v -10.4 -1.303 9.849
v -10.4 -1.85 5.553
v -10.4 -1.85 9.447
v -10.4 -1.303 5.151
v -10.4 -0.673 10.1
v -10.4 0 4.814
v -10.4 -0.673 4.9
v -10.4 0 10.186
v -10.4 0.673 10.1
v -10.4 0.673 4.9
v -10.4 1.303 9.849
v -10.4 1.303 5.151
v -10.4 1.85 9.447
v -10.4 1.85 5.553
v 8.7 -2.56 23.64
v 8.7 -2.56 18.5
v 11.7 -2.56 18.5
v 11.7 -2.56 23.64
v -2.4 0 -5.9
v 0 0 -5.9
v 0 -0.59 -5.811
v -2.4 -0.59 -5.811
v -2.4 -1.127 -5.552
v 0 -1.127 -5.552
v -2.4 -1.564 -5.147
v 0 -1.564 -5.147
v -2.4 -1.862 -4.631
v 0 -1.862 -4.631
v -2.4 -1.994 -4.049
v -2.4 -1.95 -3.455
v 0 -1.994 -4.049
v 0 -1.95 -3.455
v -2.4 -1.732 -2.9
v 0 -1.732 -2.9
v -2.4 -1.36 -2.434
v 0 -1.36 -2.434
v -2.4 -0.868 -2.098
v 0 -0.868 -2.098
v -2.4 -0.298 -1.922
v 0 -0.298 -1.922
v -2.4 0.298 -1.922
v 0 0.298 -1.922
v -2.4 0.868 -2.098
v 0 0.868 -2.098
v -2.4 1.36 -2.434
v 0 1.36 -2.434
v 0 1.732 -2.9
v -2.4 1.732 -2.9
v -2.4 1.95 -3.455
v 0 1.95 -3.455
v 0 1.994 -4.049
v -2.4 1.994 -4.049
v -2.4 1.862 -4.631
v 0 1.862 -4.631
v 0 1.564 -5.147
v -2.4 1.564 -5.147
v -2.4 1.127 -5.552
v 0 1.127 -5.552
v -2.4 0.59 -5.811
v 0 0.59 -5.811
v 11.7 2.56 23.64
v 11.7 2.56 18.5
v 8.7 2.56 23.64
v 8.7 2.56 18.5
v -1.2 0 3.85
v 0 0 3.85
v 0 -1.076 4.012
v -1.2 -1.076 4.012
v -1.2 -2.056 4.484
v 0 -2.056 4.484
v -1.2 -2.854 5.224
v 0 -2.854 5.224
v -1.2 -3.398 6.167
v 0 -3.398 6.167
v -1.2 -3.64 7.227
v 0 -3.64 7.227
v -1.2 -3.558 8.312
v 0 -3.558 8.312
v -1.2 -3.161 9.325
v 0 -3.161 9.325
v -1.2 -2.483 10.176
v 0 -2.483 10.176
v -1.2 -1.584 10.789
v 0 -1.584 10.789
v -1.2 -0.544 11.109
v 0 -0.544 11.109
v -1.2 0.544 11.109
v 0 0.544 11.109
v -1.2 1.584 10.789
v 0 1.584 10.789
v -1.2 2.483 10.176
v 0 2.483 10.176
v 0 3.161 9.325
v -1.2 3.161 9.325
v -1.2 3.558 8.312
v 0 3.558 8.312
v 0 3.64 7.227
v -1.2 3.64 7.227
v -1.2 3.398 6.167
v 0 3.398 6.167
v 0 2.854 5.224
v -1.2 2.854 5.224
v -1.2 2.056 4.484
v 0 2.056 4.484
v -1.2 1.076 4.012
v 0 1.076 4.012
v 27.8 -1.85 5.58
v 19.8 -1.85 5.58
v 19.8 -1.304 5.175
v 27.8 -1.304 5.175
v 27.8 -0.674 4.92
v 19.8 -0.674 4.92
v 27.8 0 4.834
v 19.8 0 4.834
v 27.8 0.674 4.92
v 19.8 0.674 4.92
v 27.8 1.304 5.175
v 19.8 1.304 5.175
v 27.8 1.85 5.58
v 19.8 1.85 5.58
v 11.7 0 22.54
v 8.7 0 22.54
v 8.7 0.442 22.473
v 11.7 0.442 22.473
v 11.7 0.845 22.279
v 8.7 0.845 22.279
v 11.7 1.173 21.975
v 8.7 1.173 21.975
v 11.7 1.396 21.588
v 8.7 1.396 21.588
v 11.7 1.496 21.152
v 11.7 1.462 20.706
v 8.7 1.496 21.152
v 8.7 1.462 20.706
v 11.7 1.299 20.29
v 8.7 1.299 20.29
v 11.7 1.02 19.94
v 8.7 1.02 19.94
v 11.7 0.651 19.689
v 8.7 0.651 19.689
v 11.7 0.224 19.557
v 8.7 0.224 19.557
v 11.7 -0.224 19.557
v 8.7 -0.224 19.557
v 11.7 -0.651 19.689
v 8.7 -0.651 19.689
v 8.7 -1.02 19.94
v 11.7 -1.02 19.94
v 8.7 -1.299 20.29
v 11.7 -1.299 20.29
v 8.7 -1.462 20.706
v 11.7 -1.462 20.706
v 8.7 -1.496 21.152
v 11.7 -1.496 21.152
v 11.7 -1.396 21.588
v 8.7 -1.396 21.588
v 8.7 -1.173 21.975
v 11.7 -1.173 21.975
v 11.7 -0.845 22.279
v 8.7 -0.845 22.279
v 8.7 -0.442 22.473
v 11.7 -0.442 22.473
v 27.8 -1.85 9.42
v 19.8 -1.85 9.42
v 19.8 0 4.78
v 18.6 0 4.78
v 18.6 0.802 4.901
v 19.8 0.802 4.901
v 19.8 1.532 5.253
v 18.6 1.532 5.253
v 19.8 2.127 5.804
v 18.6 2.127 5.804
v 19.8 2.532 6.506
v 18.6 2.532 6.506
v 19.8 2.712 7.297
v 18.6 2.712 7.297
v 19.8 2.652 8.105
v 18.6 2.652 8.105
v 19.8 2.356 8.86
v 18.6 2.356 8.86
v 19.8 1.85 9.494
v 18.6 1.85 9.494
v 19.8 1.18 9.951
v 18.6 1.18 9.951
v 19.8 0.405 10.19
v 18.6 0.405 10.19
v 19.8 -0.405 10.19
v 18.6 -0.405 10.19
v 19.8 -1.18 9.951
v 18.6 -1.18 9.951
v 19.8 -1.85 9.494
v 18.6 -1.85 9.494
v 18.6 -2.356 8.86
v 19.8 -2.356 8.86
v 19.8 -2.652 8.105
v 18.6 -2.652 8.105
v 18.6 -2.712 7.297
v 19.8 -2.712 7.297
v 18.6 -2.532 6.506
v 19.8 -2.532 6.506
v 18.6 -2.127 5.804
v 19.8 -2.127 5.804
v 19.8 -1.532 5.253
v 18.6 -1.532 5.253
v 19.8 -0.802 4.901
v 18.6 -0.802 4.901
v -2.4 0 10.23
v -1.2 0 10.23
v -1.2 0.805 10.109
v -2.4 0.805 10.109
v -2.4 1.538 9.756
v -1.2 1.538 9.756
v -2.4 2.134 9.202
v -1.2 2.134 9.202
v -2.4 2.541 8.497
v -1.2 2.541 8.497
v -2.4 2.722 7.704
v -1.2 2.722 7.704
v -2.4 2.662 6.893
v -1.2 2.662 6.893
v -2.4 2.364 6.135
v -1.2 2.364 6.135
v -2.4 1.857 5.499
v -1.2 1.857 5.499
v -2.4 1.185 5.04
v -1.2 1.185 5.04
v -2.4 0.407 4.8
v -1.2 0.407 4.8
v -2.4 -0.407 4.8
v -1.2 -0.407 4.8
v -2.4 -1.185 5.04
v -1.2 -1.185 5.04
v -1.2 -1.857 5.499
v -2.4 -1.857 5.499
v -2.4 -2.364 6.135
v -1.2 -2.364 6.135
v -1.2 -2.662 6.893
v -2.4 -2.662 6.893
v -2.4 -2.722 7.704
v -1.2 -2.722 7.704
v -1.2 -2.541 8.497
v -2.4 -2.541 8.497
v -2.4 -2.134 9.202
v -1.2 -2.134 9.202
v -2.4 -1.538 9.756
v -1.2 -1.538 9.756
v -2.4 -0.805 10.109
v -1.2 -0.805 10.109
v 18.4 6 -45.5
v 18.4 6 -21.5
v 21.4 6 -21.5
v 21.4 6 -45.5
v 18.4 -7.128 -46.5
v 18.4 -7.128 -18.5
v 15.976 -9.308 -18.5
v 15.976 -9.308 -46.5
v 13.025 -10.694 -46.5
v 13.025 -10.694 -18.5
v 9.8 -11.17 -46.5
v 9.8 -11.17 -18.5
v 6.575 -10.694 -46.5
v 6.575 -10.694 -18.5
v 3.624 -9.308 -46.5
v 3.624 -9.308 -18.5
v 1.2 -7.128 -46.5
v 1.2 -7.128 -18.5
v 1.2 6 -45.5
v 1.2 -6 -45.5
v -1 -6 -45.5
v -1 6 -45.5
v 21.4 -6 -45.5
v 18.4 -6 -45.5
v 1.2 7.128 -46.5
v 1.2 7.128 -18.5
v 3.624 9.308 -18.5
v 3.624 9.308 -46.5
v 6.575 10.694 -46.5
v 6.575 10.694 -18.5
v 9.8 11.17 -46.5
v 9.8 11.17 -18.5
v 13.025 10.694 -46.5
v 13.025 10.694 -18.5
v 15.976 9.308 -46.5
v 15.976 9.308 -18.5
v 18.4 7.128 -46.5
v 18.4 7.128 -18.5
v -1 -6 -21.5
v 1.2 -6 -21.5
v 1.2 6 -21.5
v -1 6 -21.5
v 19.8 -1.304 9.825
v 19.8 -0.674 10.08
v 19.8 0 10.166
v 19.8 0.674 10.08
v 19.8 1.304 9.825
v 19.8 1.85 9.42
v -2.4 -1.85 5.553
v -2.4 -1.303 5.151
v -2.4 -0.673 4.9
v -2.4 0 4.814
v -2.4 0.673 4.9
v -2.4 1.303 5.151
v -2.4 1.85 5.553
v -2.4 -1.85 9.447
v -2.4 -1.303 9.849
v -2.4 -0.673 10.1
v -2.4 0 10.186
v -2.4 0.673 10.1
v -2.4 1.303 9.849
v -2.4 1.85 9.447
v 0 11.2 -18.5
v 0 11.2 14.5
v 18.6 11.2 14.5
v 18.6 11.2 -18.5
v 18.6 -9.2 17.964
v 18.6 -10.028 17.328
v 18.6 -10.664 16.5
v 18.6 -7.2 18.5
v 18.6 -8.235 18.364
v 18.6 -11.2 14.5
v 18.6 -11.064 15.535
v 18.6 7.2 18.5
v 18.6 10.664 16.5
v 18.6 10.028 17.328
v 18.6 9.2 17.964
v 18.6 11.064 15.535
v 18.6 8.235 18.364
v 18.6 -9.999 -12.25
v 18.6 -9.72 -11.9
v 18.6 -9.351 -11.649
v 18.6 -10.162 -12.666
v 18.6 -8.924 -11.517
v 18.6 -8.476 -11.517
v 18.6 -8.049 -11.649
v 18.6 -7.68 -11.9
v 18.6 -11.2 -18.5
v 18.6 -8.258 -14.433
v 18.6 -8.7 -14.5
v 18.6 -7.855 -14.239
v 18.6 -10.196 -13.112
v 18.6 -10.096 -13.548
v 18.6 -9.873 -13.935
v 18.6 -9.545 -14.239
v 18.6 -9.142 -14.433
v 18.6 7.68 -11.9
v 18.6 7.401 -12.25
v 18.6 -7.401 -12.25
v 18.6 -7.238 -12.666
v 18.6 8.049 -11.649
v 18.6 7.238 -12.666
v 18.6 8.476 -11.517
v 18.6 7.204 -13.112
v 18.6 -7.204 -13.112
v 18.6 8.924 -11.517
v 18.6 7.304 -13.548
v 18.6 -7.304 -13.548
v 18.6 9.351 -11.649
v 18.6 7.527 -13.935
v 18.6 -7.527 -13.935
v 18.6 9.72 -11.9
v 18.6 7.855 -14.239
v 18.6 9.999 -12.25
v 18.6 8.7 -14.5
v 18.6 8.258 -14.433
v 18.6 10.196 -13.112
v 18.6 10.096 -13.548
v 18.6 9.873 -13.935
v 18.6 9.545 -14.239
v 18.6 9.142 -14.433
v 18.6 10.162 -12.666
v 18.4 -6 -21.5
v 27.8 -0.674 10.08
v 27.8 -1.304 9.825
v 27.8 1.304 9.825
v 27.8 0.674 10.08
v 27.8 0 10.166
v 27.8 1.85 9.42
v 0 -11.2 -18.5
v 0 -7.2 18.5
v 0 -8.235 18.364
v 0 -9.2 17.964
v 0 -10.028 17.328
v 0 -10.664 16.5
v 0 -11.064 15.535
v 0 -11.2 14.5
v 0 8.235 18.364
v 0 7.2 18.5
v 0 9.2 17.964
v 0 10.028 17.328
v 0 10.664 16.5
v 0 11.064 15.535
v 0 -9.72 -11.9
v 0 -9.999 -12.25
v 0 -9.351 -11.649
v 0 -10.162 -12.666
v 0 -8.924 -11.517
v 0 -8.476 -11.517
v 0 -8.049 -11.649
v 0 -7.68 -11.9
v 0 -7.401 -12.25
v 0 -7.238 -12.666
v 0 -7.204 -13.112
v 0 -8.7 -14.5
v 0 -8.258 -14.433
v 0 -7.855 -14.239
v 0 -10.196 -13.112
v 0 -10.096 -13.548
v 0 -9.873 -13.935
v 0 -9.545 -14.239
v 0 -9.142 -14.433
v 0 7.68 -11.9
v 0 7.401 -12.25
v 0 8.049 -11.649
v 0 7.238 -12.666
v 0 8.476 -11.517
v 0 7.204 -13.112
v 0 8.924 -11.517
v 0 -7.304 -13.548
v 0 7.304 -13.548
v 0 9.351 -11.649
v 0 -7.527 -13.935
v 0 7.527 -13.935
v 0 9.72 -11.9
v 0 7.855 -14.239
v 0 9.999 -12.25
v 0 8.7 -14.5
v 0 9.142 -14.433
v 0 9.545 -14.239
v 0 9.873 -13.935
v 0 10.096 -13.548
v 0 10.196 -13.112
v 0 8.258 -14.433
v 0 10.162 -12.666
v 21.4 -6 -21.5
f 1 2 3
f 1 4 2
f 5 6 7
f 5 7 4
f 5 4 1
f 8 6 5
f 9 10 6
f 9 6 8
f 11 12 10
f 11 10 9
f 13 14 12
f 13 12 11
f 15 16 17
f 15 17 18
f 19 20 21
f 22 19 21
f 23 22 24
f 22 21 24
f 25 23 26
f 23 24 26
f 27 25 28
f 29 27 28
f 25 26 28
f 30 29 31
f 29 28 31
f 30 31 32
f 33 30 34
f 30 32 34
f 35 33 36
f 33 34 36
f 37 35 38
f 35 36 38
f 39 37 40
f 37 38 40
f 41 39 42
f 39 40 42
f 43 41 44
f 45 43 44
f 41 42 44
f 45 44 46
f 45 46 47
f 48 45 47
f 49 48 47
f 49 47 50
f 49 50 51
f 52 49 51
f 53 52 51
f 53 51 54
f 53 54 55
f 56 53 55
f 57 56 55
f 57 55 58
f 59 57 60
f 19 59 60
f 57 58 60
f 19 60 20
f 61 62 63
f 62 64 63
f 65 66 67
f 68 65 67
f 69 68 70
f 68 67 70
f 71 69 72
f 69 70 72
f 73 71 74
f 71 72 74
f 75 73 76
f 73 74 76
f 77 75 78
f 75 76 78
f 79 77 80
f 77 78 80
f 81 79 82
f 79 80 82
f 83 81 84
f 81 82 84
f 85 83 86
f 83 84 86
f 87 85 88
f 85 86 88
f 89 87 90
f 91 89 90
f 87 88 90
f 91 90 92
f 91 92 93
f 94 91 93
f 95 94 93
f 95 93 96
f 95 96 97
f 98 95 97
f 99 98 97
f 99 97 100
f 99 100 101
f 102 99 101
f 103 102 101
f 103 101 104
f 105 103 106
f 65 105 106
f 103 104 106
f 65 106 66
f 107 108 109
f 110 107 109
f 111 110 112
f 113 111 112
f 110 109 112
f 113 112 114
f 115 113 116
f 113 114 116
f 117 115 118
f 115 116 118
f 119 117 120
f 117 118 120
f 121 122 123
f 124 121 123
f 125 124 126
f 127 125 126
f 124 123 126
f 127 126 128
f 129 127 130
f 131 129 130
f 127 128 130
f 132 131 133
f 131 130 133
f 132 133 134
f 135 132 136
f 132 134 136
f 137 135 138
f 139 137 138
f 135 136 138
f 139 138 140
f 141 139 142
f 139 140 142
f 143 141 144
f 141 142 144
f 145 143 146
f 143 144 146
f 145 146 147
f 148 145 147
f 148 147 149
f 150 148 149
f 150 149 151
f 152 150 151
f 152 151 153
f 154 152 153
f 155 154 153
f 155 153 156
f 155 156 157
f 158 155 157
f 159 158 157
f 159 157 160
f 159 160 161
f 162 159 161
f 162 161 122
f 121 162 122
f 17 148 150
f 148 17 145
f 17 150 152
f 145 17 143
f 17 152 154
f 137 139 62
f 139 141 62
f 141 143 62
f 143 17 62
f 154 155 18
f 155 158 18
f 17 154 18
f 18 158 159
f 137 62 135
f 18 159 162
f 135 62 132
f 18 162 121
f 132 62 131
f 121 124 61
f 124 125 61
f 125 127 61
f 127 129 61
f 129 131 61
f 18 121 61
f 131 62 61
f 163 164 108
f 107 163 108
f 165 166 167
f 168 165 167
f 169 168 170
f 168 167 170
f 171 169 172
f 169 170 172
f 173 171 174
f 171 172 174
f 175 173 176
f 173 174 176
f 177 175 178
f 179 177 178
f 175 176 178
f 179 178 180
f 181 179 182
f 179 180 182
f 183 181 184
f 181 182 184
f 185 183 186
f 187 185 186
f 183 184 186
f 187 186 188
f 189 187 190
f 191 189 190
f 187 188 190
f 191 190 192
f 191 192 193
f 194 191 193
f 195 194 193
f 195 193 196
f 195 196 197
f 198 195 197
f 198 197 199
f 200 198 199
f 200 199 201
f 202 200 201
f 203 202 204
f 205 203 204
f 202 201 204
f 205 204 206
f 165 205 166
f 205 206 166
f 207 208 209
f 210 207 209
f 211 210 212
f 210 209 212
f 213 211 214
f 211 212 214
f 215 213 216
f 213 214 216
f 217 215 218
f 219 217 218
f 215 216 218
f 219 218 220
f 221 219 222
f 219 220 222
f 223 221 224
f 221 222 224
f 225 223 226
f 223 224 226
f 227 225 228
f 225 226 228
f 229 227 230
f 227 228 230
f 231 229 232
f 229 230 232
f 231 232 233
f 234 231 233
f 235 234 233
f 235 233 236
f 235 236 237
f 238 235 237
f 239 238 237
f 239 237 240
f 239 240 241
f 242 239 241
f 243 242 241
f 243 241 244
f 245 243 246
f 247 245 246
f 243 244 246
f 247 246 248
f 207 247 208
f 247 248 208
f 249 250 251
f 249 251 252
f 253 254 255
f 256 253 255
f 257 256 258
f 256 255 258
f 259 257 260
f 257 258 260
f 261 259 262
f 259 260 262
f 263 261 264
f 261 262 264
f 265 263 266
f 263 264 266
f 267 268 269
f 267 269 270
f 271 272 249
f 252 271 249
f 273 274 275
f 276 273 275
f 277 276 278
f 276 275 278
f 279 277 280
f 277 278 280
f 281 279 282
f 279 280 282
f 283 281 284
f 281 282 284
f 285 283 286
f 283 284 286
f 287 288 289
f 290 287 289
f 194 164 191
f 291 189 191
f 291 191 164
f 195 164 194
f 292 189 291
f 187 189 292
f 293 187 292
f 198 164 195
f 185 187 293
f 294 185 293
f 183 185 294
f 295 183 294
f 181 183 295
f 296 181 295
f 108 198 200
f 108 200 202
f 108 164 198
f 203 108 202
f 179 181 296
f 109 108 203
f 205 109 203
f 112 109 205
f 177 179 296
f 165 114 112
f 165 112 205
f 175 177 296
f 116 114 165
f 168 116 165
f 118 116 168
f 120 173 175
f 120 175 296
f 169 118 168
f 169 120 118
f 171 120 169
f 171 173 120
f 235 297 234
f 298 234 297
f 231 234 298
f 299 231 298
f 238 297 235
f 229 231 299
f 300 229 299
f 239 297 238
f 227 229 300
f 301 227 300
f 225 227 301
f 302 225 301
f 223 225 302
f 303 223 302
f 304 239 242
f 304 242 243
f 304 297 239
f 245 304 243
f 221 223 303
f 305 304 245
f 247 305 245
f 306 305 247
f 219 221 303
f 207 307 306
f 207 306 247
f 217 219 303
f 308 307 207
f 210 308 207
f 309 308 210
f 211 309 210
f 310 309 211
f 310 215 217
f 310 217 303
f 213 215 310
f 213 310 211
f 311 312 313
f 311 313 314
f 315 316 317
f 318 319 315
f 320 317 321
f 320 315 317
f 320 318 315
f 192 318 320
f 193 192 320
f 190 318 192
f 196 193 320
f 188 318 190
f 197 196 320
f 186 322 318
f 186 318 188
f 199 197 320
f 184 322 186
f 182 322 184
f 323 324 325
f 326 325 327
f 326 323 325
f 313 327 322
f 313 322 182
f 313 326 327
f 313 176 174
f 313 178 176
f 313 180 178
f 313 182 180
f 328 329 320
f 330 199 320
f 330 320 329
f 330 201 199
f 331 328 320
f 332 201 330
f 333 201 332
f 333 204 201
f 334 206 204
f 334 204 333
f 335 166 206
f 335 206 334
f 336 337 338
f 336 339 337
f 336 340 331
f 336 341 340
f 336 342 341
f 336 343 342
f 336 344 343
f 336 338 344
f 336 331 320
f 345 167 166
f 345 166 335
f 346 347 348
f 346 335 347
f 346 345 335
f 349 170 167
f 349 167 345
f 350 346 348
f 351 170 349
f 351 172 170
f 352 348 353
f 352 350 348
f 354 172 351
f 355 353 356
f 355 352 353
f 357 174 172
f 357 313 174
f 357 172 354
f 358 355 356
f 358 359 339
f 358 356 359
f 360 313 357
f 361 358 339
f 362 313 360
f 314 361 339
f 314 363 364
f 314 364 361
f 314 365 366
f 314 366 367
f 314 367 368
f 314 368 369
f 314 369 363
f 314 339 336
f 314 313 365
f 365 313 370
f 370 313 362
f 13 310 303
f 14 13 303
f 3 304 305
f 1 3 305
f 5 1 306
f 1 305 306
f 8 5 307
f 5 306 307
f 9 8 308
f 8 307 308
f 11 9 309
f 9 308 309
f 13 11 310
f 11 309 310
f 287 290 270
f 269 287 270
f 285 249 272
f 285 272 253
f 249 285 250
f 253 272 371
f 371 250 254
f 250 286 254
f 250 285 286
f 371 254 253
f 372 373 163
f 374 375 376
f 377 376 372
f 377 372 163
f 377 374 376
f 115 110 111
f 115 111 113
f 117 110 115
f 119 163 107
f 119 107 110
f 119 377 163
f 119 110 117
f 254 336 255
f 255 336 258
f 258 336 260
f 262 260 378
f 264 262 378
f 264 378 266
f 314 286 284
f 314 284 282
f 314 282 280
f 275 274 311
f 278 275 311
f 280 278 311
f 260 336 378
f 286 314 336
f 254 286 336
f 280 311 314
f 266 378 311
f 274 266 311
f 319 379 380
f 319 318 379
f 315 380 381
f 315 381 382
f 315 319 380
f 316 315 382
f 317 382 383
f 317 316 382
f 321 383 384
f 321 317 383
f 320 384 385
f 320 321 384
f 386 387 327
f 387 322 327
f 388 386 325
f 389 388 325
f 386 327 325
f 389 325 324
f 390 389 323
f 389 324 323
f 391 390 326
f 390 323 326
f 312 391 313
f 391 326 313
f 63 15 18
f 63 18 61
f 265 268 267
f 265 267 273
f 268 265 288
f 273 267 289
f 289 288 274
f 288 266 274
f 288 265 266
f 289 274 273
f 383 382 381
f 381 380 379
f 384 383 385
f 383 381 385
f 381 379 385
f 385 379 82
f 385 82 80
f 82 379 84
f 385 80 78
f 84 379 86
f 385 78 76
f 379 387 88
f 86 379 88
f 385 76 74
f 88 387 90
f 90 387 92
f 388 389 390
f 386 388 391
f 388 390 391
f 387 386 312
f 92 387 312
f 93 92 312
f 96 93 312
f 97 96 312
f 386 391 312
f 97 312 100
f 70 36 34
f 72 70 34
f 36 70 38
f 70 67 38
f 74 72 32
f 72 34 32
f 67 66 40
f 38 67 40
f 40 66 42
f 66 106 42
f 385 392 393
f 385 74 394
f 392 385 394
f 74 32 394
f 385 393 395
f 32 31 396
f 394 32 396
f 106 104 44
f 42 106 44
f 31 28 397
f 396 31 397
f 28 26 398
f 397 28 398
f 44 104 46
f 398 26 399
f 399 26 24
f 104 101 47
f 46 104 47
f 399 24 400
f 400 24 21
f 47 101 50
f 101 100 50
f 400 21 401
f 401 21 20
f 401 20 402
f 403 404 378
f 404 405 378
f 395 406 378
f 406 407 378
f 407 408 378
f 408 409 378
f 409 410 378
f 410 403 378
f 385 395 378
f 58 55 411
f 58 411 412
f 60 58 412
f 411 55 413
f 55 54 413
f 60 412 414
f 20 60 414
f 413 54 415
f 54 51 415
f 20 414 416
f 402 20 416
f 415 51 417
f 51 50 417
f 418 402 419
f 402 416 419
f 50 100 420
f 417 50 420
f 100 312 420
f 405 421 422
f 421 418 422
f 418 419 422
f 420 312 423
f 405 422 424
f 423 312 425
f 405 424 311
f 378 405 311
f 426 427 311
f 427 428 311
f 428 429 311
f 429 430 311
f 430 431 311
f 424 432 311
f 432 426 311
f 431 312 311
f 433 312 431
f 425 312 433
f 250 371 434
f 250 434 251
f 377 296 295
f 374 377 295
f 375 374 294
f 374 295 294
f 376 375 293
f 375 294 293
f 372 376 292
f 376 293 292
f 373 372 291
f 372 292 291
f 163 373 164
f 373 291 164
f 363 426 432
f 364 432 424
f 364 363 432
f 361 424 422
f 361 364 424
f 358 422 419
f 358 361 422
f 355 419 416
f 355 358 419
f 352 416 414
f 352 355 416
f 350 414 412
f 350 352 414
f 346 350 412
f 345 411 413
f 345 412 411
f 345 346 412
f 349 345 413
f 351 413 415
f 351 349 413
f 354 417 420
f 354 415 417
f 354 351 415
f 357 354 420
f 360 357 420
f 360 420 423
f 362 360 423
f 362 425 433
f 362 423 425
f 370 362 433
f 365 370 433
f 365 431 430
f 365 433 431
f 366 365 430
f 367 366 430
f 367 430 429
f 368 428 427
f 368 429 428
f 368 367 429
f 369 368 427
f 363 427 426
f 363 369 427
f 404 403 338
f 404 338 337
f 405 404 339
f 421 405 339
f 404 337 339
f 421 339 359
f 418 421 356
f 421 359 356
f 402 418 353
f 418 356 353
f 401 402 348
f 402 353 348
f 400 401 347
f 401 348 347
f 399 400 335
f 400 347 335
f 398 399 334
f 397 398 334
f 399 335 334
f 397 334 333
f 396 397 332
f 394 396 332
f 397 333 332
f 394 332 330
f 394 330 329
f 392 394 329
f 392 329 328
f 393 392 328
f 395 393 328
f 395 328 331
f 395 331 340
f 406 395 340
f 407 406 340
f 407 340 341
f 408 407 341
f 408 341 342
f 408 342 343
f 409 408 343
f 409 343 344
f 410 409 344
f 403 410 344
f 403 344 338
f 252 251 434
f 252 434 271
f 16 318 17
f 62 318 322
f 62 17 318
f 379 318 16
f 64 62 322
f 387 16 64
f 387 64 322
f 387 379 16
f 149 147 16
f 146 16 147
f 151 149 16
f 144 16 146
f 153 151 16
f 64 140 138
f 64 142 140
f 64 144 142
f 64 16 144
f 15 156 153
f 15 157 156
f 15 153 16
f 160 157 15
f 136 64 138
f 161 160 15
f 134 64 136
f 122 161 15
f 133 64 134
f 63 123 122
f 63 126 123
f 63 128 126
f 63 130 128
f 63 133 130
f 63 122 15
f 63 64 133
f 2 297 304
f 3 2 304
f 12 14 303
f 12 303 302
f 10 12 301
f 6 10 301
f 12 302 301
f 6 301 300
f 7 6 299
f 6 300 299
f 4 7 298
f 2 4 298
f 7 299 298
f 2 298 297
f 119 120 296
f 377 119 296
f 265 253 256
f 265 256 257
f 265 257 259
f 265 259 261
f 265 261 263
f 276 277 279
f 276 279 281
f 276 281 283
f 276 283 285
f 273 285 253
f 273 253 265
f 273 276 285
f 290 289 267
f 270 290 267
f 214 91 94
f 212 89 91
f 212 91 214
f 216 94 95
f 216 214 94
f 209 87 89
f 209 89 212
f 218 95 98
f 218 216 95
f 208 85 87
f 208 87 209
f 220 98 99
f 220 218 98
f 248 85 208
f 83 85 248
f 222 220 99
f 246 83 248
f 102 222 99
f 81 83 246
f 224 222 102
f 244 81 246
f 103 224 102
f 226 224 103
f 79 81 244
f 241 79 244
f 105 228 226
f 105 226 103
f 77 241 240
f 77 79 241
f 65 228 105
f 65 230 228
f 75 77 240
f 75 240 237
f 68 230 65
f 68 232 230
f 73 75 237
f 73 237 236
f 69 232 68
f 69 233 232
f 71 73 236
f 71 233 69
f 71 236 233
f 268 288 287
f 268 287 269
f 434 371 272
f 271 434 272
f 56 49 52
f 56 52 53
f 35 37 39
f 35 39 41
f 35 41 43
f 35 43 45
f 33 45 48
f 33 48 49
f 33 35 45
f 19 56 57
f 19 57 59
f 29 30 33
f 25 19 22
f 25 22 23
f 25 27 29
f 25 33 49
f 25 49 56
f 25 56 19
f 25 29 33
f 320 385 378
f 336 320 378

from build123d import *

# Parameters (mm, degrees)
SKETCH1_W            = 37
SKETCH1_H            = 22.4
BOSS_EXTRUDE1_DEPTH  = 18.6
FILLET1_R            = 4
SKETCH2_R            = 3.65
BOSS_EXTRUDE2_DEPTH  = 1.2
SKETCH3_R            = 2.73
BOSS_EXTRUDE3_DEPTH  = 1.2
BOSS_EXTRUDE4_DEPTH  = 8
SKETCH5_R            = 2.72
BOSS_EXTRUDE5_DEPTH  = 1.2
BOSS_EXTRUDE6_DEPTH  = 8
SKETCH7_R            = 2
BOSS_EXTRUDE7_DEPTH  = 2.4
SKETCH8_W            = 5.14
SKETCH8_H            = 5.12
BOSS_EXTRUDE8_DEPTH  = 1.5
BOSS_EXTRUDE10_DEPTH = 28
SKETCH12_W           = 24
SKETCH12_H           = 12
BOSS_EXTRUDE11_DEPTH = 3
SKETCH13_R           = 1.5
CUT_EXTRUDE1_DEPTH   = 28
SKETCH14_R           = 1.5
CUT_EXTRUDE2_DEPTH   = 28


with BuildPart() as part:
    # Sketch1 → Boss-Extrude1 (new body)
    with BuildSketch(Plane(origin=(0, 0, 0), x_dir=(0, 0, -1), z_dir=(1, 0, 0))):
        Rectangle(SKETCH1_W, SKETCH1_H)
    extrude(amount=BOSS_EXTRUDE1_DEPTH)

    # Fillet1
    fillet1_edges = [part.edges().sort_by_distance(p)[0] for p in [
        (9.3, 11.2, 18.5),
        (9.3, -11.2, 18.5),
    ]]
    fillet(fillet1_edges, radius=FILLET1_R)

    # Sketch2 → Boss-Extrude2 (add)
    with BuildSketch(Plane.ZY):
        with Locations(Location((7.5, 0, 0), (0, 0, 180))):
            Circle(SKETCH2_R)
    extrude(amount=BOSS_EXTRUDE2_DEPTH)

    # Sketch3 → Boss-Extrude3 (add)
    with BuildSketch(Plane.ZY.offset(1.2)):
        with Locations((7.5, 0)):
            Circle(SKETCH3_R)
    extrude(amount=BOSS_EXTRUDE3_DEPTH)

    # Sketch4 → Boss-Extrude4 (add)
    with BuildSketch(Plane.ZY.offset(2.4)):
        with BuildLine():
            Line((5.552798511, -1.85), (9.447201489, -1.85))
            ThreePointArc((9.447201489, -1.85), (10.185906483, 0), (9.447201489, 1.85))
            Line((9.447201489, 1.85), (5.552798511, 1.85))
            ThreePointArc((5.552798511, 1.85), (4.814093517, 0), (5.552798511, -1.85))
        make_face()
    extrude(amount=BOSS_EXTRUDE4_DEPTH)

    # Sketch5 → Boss-Extrude5 (add)
    with BuildSketch(Plane(origin=(18.6, 0, 0), x_dir=(0, 0, -1), z_dir=(1, 0, 0))):
        with Locations((-7.5, 0)):
            Circle(SKETCH5_R)
    extrude(amount=BOSS_EXTRUDE5_DEPTH)

    # Sketch6 → Boss-Extrude6 (add)
    with BuildSketch(Plane(origin=(19.8, 0, 0), x_dir=(0, 0, -1), z_dir=(1, 0, 0))):
        with BuildLine():
            Line((-9.419930554, -1.85), (-5.580069446, -1.85))
            ThreePointArc((-5.580069446, -1.85), (-4.833797957, 0), (-5.580069446, 1.85))
            Line((-5.580069446, 1.85), (-9.419930554, 1.85))
            ThreePointArc((-9.419930554, 1.85), (-10.166202043, 0), (-9.419930554, -1.85))
        make_face()
    extrude(amount=BOSS_EXTRUDE6_DEPTH)

    # Sketch7 → Boss-Extrude7 (add)
    with BuildSketch(Plane.ZY):
        with Locations(Location((-3.9, 0, 0), (0, 0, 180))):
            Circle(SKETCH7_R)
    extrude(amount=BOSS_EXTRUDE7_DEPTH)

    # Sketch8 → Boss-Extrude8 (add, symmetric)
    with BuildSketch(Plane.ZY.offset(-10.2)):
        with Locations((21.07, 0)):
            Rectangle(SKETCH8_W, SKETCH8_H)
    extrude(amount=BOSS_EXTRUDE8_DEPTH, both=True)

    # Sketch11 → Boss-Extrude10 (add)
    with BuildSketch(Plane(origin=(0, 0, -18.5), x_dir=(-1, 0, 0), z_dir=(0, 0, -1))):
        with BuildLine():
            Line((-18.4, 7.128036195), (-18.4, -7.128036195))
            ThreePointArc((-18.4, -7.128036195), (-9.8, -11.17), (-1.2, -7.128036195))
            Line((-1.2, -7.128036195), (-1.2, 7.128036195))
            ThreePointArc((-1.2, 7.128036195), (-9.8, 11.17), (-18.4, 7.128036195))
        make_face()
    extrude(amount=BOSS_EXTRUDE10_DEPTH)

    # Sketch12 → Boss-Extrude11 (add)
    with BuildSketch(Plane(origin=(18.4, 0, 0), x_dir=(0, 0, -1), z_dir=(1, 0, 0))):
        with Locations((33.5, 0)):
            Rectangle(SKETCH12_W, SKETCH12_H)
    boss_extrude11 = extrude(amount=BOSS_EXTRUDE11_DEPTH)

    # Mirror1: Boss-Extrude11 across plane
    add(boss_extrude11.mirror(Plane.ZY.offset(-10.2)))

    # Sketch13 → Cut-Extrude1 (cut)
    with BuildSketch(Plane(origin=(18.6, 0, 0), x_dir=(0, 0, -1), z_dir=(1, 0, 0))):
        with Locations((13, -8.7)):
            Circle(SKETCH13_R)
    cut_extrude1 = extrude(amount=-CUT_EXTRUDE1_DEPTH, mode=Mode.SUBTRACT)

    # Mirror2: Cut-Extrude1 across plane
    add(cut_extrude1.mirror(Plane.ZX), mode=Mode.SUBTRACT)

    # Sketch14 → Cut-Extrude2 (cut)
    with BuildSketch(Plane.ZY.offset(-8.7)):
        with Locations((21.04, 0)):
            Circle(SKETCH14_R)
    extrude(amount=-CUT_EXTRUDE2_DEPTH, mode=Mode.SUBTRACT)


solid = part.part
